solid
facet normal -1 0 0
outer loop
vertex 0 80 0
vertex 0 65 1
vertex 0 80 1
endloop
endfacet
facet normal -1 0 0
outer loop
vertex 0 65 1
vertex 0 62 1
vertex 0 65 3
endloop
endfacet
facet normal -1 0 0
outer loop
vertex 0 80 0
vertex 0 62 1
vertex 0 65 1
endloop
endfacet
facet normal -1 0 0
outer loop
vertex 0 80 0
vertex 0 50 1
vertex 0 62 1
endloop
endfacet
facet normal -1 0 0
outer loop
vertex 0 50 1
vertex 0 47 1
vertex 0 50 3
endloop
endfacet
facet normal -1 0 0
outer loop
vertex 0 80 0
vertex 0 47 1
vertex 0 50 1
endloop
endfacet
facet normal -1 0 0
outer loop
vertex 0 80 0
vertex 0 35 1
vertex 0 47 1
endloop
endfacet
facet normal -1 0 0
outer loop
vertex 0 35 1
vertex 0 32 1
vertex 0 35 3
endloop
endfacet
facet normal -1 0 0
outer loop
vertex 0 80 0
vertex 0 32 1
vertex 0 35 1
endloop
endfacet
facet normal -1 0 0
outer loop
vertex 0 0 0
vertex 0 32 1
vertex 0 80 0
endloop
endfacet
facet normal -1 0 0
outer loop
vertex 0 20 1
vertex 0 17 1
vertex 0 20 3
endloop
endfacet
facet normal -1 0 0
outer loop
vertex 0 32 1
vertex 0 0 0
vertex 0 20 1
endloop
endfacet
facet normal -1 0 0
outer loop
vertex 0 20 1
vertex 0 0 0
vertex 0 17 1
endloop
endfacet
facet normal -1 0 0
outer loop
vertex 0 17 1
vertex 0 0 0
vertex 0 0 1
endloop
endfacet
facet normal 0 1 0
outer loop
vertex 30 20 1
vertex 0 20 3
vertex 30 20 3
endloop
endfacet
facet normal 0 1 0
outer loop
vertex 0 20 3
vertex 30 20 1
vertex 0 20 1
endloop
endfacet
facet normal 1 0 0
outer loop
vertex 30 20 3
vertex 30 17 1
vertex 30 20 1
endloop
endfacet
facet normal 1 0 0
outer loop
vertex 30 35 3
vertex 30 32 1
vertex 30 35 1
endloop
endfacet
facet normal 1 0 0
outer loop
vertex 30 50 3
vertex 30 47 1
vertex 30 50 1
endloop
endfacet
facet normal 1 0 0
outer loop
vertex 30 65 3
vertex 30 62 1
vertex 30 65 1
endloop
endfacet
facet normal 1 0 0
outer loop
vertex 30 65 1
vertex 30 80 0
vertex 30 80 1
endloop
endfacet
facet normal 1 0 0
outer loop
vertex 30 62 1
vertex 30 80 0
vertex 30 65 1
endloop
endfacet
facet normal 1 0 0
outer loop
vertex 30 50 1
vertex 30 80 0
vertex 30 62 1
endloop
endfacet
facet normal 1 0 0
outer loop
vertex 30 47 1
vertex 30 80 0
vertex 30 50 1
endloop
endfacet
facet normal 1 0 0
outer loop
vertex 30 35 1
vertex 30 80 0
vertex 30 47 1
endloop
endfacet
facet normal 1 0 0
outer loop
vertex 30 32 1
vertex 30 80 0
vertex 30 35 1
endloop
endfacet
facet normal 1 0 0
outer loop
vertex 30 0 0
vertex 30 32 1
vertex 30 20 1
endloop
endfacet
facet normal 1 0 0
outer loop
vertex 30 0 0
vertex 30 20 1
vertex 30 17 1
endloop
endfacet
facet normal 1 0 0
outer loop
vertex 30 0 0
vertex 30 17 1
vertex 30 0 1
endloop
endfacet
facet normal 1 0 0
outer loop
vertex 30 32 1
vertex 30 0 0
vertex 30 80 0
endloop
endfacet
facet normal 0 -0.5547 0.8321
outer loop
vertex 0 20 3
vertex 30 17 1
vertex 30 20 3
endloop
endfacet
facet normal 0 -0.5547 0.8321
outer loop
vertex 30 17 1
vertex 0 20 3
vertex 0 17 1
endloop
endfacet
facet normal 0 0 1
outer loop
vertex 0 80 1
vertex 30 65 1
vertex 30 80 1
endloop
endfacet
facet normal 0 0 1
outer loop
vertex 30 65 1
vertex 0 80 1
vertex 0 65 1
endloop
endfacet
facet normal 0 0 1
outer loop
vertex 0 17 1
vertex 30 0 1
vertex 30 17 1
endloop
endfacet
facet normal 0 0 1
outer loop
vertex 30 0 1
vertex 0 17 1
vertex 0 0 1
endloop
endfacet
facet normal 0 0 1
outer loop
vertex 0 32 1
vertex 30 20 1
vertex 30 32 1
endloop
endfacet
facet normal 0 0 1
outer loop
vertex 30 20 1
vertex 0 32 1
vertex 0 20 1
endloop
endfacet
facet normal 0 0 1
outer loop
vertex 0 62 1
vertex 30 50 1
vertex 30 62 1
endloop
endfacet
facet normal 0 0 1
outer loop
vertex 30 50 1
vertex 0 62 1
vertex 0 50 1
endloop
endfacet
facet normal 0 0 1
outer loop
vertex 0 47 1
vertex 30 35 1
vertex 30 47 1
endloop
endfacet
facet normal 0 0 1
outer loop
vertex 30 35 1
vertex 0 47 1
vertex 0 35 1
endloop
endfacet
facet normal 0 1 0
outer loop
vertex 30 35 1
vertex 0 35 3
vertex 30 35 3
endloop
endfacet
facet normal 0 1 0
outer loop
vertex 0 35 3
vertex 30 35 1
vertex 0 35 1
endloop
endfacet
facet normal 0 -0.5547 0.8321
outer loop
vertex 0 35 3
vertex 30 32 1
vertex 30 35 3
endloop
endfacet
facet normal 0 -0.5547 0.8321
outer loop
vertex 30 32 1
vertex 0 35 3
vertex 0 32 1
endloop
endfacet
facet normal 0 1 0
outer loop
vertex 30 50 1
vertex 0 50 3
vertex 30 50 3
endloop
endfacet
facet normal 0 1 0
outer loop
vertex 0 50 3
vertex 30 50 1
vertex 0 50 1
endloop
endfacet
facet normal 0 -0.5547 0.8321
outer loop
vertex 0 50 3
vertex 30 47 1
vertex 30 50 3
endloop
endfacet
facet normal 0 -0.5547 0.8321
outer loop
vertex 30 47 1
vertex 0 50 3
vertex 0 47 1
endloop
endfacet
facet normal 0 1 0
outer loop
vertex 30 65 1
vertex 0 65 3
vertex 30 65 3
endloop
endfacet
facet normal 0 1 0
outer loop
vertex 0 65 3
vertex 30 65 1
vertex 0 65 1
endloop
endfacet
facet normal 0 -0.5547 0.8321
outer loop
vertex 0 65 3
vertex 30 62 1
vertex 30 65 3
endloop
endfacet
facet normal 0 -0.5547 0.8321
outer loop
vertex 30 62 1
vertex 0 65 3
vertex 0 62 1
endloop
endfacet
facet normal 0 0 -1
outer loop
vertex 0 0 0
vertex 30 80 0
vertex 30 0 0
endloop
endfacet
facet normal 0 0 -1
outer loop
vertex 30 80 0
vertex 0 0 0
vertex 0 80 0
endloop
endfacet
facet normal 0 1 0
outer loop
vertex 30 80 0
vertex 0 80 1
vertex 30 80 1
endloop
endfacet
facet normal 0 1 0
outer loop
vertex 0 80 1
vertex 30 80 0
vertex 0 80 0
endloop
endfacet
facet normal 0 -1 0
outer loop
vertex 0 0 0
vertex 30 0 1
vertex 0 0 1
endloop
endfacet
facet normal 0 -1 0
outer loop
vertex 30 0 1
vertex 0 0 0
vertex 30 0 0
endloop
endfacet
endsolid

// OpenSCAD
cube([30,80,1]);
for(y=[20:15:70])
  translate([0,y,1]) rotate([90,-90,90]) linear_extrude(30,convexity=3) polygon([[0,0],[2,0],[0,3]]);
